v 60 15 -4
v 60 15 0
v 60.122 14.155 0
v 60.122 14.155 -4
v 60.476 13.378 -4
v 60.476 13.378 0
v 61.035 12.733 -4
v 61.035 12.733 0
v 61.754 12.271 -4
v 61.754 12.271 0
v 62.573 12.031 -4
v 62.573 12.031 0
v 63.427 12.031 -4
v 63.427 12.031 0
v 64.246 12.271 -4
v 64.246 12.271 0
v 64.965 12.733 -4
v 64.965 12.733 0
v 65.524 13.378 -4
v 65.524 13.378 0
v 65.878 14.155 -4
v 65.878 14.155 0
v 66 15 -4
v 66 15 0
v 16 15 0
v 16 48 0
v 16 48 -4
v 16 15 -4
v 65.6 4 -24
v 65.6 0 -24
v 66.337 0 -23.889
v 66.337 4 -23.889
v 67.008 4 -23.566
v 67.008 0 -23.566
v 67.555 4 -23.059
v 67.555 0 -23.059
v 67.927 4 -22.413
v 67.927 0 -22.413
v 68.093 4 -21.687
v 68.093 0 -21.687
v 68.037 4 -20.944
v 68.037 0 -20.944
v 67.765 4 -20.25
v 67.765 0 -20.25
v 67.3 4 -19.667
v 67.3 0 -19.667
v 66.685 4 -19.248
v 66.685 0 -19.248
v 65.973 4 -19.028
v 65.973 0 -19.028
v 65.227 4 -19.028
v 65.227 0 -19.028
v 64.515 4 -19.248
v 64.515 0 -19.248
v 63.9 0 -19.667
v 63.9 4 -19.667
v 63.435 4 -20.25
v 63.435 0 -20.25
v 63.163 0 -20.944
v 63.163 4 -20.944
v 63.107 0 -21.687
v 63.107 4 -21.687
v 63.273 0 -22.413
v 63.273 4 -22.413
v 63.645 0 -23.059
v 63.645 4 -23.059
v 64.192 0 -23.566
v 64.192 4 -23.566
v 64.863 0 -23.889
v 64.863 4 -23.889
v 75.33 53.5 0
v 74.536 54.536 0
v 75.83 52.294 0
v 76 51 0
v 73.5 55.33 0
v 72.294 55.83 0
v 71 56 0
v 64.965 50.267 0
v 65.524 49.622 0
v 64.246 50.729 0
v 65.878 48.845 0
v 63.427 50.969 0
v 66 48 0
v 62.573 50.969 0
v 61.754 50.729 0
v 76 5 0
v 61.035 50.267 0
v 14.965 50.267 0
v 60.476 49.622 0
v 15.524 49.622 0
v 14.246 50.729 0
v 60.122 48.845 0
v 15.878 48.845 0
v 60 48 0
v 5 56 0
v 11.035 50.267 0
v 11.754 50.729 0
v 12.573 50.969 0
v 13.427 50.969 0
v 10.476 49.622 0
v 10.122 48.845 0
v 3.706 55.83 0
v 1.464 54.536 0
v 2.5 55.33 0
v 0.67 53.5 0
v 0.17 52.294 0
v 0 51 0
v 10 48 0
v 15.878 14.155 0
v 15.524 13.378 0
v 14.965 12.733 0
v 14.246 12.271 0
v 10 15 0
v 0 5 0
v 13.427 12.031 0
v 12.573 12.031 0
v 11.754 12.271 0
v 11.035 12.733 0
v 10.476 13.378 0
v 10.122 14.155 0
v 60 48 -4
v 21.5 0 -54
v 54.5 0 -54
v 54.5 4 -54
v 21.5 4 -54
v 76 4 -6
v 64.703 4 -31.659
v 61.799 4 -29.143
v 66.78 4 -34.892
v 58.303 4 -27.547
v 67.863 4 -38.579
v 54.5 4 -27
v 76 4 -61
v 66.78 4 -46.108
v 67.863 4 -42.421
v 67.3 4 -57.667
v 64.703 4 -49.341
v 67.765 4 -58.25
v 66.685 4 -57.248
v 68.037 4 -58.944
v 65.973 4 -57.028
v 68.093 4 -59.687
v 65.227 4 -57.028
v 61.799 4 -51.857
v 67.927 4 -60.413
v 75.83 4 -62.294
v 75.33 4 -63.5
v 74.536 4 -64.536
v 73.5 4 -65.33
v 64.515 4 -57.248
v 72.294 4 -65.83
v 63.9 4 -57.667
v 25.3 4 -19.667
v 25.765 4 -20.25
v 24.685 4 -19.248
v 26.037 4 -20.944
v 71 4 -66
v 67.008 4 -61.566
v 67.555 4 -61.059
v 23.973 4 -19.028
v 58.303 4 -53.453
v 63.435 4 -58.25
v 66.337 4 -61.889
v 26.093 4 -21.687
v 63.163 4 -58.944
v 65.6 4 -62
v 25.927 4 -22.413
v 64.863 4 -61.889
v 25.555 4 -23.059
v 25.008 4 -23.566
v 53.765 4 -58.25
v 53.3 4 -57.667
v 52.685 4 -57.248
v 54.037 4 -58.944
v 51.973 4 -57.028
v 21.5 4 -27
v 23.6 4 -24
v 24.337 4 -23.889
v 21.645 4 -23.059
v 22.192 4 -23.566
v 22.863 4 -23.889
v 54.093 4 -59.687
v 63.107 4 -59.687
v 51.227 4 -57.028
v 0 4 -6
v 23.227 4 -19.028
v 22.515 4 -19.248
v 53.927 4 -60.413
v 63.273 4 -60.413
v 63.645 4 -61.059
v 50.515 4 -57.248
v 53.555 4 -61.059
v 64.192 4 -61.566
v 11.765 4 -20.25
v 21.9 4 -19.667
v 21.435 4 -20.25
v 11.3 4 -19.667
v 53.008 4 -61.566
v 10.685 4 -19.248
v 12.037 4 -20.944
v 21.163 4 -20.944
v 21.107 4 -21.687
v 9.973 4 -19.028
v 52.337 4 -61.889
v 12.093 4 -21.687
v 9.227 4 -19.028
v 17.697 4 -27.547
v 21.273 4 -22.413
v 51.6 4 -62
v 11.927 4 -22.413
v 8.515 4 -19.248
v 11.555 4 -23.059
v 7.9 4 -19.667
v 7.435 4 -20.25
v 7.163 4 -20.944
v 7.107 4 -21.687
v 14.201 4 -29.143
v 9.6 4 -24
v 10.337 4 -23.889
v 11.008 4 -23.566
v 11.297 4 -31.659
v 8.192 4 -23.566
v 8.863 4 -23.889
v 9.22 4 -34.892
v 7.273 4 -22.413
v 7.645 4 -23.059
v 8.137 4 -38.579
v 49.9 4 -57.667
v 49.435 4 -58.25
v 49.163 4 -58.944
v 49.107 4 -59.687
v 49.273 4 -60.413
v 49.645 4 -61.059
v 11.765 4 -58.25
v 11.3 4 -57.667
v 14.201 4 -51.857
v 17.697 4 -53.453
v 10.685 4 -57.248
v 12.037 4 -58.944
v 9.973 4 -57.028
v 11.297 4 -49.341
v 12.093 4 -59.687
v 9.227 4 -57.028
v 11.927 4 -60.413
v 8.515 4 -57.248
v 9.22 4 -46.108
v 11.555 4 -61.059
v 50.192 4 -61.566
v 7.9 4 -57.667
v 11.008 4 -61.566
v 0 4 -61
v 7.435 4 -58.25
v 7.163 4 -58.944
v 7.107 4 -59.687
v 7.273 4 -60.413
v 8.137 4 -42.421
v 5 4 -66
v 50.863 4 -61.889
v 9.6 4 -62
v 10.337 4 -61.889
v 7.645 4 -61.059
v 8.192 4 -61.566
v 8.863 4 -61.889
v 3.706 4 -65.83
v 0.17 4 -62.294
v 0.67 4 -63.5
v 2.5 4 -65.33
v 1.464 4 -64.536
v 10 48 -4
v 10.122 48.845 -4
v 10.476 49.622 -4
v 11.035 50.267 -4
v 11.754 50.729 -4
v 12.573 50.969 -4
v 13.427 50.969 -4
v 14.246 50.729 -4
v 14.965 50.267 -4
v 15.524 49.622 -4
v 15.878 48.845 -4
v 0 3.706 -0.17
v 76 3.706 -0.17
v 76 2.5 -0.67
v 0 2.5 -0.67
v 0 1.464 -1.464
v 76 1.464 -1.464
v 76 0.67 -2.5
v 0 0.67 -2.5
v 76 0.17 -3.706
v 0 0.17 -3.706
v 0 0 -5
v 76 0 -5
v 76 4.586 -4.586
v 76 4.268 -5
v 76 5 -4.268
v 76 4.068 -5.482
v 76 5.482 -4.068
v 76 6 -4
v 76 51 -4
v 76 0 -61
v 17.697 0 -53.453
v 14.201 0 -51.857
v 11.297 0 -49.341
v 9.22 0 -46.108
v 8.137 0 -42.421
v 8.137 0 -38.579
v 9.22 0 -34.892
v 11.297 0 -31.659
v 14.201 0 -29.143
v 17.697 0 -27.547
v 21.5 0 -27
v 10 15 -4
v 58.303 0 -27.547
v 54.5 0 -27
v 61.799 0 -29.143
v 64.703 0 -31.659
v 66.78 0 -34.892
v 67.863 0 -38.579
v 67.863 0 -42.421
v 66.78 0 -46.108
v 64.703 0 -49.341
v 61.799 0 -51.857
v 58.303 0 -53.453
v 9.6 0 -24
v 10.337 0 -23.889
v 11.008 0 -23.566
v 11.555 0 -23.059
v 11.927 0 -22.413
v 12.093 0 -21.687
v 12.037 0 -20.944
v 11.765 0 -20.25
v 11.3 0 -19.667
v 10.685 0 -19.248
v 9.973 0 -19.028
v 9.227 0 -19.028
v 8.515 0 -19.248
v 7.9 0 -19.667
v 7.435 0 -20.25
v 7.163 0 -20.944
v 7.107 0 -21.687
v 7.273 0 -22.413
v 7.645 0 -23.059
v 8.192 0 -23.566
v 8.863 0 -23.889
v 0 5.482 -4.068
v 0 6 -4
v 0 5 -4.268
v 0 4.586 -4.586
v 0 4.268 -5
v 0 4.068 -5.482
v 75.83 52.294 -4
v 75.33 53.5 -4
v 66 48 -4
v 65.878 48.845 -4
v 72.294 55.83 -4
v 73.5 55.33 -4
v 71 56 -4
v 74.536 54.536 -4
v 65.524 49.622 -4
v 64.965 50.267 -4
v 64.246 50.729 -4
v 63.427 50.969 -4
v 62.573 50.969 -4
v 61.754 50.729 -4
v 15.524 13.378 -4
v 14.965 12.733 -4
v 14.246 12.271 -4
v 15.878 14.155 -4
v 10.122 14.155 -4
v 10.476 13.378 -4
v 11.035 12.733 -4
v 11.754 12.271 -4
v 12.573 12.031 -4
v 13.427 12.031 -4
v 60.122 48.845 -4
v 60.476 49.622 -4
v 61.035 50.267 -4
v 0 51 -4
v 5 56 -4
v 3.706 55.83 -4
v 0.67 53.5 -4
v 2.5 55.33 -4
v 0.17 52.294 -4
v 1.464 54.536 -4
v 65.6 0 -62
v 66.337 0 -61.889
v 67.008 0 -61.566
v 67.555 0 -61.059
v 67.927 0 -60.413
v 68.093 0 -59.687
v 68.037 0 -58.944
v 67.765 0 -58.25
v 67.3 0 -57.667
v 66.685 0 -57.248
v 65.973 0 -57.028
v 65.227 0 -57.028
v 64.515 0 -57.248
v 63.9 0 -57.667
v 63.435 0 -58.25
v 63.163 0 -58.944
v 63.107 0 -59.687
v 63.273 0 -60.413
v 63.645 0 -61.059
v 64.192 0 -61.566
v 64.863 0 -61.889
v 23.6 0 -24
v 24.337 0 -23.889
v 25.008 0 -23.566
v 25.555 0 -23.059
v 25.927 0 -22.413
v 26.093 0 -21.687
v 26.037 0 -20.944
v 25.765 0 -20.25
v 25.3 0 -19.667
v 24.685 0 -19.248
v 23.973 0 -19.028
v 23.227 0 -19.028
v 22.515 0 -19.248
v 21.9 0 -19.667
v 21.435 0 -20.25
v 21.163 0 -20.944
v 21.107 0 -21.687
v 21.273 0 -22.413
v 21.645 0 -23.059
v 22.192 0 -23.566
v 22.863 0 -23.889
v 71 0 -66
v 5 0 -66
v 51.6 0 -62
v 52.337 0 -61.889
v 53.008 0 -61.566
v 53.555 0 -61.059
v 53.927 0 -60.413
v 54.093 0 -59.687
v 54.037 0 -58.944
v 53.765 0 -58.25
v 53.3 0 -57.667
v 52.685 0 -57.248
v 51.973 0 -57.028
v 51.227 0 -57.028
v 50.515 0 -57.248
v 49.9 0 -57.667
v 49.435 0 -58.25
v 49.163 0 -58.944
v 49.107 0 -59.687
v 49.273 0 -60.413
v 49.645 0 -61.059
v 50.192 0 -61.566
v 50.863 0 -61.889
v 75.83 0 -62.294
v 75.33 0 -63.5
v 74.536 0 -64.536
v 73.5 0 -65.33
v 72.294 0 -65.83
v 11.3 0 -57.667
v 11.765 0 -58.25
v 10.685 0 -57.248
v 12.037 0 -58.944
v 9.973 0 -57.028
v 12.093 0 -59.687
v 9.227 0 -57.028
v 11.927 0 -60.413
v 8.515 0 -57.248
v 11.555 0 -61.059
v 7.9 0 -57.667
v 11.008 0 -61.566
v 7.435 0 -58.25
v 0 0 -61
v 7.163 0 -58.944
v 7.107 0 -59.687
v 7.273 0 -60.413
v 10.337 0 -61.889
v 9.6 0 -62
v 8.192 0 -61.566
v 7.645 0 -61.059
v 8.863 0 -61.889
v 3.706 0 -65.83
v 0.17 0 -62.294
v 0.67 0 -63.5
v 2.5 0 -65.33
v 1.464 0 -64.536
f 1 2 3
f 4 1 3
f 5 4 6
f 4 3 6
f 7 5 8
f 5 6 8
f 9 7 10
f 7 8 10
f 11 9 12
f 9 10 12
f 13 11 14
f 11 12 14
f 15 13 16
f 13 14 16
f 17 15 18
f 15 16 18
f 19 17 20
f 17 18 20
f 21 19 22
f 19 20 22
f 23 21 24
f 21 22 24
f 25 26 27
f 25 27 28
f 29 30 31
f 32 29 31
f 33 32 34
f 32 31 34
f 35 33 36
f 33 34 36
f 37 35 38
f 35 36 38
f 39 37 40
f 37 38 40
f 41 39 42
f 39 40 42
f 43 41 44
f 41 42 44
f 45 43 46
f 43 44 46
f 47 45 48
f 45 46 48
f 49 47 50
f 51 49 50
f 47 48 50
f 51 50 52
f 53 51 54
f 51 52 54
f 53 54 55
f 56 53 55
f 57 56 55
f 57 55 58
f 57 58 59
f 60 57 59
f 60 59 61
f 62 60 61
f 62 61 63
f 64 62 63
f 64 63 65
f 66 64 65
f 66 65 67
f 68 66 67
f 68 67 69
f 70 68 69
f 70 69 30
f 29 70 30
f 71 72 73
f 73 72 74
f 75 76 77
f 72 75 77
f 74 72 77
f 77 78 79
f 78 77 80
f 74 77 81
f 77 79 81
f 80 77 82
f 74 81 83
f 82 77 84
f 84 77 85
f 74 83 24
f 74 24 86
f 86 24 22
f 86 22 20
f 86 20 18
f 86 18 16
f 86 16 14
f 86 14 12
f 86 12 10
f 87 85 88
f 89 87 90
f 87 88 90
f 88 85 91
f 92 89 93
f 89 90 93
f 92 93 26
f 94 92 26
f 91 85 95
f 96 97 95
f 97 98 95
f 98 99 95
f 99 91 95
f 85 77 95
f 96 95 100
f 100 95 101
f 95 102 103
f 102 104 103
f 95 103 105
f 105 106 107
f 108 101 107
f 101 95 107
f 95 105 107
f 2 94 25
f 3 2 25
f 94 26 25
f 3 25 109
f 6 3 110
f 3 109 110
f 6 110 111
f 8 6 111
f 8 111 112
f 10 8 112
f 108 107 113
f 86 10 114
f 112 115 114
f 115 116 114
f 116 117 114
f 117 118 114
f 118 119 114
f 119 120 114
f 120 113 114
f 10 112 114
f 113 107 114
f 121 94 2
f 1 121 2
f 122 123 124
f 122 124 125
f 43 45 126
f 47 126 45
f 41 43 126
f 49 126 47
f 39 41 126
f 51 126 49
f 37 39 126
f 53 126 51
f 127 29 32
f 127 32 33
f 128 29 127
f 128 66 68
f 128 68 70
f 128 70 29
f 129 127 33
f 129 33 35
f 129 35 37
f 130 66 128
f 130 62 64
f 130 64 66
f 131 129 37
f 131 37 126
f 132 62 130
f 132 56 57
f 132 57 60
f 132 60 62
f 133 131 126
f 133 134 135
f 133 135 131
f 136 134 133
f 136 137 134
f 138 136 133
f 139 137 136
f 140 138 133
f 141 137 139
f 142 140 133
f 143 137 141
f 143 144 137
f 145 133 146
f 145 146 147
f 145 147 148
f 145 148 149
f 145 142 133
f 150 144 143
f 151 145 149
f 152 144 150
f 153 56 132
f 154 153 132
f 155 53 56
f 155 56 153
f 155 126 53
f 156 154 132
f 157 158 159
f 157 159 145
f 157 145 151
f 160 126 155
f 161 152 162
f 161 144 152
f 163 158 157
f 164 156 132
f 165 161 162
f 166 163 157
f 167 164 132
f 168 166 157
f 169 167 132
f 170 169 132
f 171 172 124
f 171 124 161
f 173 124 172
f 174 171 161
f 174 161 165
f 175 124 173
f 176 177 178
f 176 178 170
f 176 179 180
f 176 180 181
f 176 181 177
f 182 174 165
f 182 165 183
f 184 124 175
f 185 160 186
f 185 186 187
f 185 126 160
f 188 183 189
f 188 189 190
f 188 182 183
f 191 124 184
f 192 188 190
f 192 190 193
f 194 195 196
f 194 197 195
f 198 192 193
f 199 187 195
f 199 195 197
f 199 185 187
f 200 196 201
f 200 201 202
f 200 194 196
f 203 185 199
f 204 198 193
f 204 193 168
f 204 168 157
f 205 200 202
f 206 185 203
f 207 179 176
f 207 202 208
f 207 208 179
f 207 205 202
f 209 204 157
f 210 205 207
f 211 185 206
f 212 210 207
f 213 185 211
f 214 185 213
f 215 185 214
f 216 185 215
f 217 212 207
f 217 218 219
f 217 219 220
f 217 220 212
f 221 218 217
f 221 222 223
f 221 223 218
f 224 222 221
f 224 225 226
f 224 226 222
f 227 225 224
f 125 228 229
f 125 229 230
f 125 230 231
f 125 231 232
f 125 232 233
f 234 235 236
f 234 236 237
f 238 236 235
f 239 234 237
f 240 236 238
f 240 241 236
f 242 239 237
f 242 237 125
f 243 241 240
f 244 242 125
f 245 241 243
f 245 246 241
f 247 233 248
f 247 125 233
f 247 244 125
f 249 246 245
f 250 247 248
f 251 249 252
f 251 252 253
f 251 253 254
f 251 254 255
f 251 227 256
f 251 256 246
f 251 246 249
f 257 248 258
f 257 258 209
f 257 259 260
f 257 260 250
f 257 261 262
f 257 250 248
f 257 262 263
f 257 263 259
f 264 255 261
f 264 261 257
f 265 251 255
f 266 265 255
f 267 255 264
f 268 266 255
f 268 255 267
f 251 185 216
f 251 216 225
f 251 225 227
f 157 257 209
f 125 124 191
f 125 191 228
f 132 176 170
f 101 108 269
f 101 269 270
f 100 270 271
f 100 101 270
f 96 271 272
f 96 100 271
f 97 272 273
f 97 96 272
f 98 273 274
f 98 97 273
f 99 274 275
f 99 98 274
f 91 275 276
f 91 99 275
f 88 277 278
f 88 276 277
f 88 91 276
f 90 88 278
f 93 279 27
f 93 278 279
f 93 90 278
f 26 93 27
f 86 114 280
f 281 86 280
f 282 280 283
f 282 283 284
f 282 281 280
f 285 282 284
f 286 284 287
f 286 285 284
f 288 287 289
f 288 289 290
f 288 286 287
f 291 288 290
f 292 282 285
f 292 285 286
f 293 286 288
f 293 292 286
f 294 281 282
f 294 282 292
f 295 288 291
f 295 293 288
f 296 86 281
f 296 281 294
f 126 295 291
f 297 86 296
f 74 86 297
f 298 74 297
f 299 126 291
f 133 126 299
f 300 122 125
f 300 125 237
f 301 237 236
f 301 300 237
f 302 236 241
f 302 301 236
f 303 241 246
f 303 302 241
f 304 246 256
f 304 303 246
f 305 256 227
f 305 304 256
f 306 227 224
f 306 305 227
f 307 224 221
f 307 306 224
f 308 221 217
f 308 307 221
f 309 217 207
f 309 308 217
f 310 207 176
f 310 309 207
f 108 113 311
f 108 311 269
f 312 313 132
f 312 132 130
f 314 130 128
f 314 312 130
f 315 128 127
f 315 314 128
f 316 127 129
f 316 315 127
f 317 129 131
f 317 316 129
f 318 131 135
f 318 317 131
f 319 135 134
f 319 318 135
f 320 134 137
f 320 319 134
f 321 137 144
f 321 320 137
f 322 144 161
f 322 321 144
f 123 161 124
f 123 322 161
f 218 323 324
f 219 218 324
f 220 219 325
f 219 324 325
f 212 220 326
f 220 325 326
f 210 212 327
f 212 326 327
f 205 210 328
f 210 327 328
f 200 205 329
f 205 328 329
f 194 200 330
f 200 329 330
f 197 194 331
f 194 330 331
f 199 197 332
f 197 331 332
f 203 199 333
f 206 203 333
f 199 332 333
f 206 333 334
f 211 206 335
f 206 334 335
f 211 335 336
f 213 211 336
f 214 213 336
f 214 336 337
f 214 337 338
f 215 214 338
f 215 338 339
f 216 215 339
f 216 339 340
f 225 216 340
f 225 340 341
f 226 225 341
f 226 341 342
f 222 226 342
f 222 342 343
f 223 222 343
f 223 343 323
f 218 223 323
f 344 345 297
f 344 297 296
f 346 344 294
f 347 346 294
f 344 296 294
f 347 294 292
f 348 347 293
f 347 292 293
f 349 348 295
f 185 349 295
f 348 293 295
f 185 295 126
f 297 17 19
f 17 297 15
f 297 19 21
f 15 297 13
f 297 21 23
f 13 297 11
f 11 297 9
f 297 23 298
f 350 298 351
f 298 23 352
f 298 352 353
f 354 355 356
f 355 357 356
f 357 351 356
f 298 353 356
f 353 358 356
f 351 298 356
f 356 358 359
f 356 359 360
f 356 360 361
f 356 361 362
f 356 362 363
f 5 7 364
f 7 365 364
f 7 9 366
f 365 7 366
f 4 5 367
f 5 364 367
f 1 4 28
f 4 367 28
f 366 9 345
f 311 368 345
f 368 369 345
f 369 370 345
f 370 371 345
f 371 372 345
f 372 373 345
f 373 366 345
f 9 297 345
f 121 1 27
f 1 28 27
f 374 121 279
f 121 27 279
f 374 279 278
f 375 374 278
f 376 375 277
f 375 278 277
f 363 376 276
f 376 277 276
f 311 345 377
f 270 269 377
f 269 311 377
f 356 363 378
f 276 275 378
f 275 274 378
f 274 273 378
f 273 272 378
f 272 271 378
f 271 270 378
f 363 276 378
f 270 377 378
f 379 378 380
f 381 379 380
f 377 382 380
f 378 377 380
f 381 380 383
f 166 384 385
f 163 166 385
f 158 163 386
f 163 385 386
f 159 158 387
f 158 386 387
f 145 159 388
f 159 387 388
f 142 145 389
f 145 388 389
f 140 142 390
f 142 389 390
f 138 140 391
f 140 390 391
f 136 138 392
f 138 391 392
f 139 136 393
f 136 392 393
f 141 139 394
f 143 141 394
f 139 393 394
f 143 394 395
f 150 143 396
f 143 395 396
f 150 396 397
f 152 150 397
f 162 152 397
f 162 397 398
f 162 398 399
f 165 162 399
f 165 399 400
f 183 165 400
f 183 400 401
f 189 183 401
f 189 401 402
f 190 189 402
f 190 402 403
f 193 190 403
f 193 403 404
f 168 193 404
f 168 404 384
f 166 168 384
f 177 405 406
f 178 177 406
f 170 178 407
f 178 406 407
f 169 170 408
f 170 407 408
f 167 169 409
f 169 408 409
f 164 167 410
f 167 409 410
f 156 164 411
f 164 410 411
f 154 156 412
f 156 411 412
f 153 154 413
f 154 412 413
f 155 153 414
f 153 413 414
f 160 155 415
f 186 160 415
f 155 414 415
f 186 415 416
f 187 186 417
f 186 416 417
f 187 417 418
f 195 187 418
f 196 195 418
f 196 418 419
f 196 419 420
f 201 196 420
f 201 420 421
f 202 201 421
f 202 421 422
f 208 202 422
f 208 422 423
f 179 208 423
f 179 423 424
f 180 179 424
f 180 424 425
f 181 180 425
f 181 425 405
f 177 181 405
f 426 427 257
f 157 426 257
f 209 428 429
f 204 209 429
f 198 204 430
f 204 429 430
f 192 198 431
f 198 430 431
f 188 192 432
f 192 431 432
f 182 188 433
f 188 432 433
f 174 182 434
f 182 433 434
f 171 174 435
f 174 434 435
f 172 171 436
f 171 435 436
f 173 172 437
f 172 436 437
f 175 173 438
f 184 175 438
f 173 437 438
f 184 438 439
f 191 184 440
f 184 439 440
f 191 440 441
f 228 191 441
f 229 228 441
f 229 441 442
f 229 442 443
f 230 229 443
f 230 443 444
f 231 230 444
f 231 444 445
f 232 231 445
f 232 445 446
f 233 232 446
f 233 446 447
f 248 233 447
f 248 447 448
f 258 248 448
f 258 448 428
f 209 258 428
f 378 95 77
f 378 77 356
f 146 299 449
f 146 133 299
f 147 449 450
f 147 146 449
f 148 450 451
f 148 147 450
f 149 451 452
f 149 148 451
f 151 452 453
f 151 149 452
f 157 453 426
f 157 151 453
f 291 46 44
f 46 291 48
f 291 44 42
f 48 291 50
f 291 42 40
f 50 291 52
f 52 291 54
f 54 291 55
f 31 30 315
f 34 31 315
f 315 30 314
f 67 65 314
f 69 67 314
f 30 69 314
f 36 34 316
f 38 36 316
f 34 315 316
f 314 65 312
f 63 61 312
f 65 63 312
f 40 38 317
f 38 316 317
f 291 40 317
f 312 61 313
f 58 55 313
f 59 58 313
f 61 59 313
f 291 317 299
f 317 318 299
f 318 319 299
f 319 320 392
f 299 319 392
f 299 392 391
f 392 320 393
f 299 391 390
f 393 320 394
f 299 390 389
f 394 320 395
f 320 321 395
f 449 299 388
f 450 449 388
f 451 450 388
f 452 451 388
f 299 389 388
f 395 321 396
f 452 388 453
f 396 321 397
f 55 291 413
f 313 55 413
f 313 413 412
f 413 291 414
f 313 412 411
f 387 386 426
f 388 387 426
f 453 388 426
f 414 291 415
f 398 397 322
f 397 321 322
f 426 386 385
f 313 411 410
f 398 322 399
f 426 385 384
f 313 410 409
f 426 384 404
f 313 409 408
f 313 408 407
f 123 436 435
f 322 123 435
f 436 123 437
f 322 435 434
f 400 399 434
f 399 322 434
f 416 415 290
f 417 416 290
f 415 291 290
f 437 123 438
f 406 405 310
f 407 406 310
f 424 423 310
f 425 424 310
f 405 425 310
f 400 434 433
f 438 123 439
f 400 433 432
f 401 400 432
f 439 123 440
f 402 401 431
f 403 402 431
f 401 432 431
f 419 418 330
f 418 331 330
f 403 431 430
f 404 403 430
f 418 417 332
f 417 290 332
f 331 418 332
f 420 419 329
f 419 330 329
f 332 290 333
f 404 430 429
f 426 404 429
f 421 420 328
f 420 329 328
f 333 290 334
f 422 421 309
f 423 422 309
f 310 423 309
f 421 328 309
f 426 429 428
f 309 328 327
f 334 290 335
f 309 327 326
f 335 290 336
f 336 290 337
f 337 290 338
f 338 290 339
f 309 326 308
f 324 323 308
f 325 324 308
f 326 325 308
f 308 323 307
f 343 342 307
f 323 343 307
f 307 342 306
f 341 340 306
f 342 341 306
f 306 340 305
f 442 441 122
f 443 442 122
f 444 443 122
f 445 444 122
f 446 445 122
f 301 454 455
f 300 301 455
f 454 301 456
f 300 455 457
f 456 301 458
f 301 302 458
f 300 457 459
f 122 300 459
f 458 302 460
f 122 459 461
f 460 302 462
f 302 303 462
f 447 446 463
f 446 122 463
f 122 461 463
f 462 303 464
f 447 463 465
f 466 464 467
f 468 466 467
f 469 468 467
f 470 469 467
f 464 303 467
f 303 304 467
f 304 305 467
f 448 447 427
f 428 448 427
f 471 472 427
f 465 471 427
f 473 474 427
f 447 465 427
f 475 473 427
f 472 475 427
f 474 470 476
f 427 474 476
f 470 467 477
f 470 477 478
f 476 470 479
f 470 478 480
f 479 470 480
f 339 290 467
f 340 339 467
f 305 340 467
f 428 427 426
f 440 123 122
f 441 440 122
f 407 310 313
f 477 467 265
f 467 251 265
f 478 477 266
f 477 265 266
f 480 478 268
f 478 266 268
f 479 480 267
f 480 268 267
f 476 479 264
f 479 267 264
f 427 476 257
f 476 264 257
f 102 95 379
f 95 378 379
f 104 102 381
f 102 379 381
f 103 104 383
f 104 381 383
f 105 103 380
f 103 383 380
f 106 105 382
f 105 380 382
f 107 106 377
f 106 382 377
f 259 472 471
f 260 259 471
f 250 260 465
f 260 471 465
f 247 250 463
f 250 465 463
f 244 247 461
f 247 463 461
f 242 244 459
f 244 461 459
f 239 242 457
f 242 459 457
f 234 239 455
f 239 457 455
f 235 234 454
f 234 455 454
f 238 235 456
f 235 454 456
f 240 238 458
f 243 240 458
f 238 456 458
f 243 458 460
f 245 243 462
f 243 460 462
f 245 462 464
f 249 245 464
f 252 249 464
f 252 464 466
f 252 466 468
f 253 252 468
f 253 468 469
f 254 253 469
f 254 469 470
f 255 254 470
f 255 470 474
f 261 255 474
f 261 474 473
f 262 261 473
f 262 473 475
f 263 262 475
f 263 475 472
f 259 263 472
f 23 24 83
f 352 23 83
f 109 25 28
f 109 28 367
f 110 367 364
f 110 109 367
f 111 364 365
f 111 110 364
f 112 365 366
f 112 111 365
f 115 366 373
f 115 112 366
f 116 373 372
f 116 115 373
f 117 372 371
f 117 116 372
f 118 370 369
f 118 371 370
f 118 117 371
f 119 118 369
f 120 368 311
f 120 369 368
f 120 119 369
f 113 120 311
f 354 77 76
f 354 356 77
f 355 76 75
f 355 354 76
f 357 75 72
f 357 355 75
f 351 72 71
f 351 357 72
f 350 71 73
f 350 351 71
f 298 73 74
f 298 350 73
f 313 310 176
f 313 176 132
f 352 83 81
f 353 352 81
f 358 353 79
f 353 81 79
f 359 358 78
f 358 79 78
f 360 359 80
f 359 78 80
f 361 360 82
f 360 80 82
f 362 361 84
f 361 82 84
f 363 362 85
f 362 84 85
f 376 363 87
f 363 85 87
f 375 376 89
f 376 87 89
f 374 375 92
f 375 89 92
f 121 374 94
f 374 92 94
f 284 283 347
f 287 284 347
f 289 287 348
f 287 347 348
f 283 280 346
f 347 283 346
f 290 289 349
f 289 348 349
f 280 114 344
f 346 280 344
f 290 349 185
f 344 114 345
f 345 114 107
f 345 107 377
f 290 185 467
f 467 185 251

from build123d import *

# Parameters (mm, degrees)
SKETCH1_W           = 4
SKETCH1_H           = 52
SKETCH1_H_2         = 4
SKETCH1_W_2         = 62
BOSS_EXTRUDE1_DEPTH = 76
SKETCH2_R           = 2.5
CUT_EXTRUDE1_DEPTH  = 116.1868048
CUT_EXTRUDE2_DEPTH  = 116.1868048
FILLET1_R           = 5
FILLET2_R           = 2


with BuildPart() as part:
    # Sketch1 → Boss-Extrude1 (new body)
    with BuildSketch(Plane(origin=(0, 0, 0), x_dir=(0, 0, -1), z_dir=(1, 0, 0))):
        with Locations((2, 30)):
            Rectangle(SKETCH1_W, SKETCH1_H)
        with Locations((2, 2)):
            Rectangle(SKETCH1_W, SKETCH1_H_2)
        with Locations((35, 2)):
            Rectangle(SKETCH1_W_2, SKETCH1_H_2)
    extrude(amount=BOSS_EXTRUDE1_DEPTH)

    # Sketch2 → Cut-Extrude1 (cut, through all)
    with BuildSketch(Plane.XZ):
        with Locations(Location((9.6, -59.5, 0), (0, 0, 270))):
            Circle(SKETCH2_R)
        with Locations(Location((9.6, -21.5, 0), (0, 0, 270))):
            Circle(SKETCH2_R)
        with Locations(Location((23.6, -21.5, 0), (0, 0, 270))):
            Circle(SKETCH2_R)
        with Locations(Location((65.6, -21.5, 0), (0, 0, 270))):
            Circle(SKETCH2_R)
        with Locations(Location((65.6, -59.5, 0), (0, 0, 270))):
            Circle(SKETCH2_R)
        with Locations(Location((51.6, -59.5, 0), (0, 0, 270))):
            Circle(SKETCH2_R)
        with BuildLine():
            Line((54.5, -54), (21.5, -54))
            ThreePointArc((21.5, -54), (8, -40.5), (21.5, -27))
            Line((21.5, -27), (54.5, -27))
            ThreePointArc((54.5, -27), (68, -40.5), (54.5, -54))
        make_face()
    extrude(amount=-CUT_EXTRUDE1_DEPTH, mode=Mode.SUBTRACT)

    # Sketch3 → Cut-Extrude2 (cut, through all)
    with BuildSketch(Plane.XY):
        with BuildLine():
            Line((16, 48), (16, 15))
            ThreePointArc((16, 15), (13, 12), (10, 15))
            Line((10, 15), (10, 48))
            ThreePointArc((10, 48), (13, 51), (16, 48))
        make_face()
        with BuildLine():
            Line((60, 48), (60, 15))
            ThreePointArc((60, 15), (63, 12), (66, 15))
            Line((66, 15), (66, 48))
            ThreePointArc((66, 48), (63, 51), (60, 48))
        make_face()
    extrude(amount=-CUT_EXTRUDE2_DEPTH, mode=Mode.SUBTRACT)

    # Fillet1
    fillet1_edges = [part.edges().sort_by_distance(p)[0] for p in [
        (38, 0, 0),
        (76, 2, -66),
        (76, 56, -2),
        (0, 56, -2),
        (0, 2, -66),
    ]]
    fillet(fillet1_edges, radius=FILLET1_R)

    # Fillet2
    fillet2_edges = [part.edges().sort_by_distance(p)[0] for p in [
        (38, 4, -4),
    ]]
    fillet(fillet2_edges, radius=FILLET2_R)


solid = part.part
